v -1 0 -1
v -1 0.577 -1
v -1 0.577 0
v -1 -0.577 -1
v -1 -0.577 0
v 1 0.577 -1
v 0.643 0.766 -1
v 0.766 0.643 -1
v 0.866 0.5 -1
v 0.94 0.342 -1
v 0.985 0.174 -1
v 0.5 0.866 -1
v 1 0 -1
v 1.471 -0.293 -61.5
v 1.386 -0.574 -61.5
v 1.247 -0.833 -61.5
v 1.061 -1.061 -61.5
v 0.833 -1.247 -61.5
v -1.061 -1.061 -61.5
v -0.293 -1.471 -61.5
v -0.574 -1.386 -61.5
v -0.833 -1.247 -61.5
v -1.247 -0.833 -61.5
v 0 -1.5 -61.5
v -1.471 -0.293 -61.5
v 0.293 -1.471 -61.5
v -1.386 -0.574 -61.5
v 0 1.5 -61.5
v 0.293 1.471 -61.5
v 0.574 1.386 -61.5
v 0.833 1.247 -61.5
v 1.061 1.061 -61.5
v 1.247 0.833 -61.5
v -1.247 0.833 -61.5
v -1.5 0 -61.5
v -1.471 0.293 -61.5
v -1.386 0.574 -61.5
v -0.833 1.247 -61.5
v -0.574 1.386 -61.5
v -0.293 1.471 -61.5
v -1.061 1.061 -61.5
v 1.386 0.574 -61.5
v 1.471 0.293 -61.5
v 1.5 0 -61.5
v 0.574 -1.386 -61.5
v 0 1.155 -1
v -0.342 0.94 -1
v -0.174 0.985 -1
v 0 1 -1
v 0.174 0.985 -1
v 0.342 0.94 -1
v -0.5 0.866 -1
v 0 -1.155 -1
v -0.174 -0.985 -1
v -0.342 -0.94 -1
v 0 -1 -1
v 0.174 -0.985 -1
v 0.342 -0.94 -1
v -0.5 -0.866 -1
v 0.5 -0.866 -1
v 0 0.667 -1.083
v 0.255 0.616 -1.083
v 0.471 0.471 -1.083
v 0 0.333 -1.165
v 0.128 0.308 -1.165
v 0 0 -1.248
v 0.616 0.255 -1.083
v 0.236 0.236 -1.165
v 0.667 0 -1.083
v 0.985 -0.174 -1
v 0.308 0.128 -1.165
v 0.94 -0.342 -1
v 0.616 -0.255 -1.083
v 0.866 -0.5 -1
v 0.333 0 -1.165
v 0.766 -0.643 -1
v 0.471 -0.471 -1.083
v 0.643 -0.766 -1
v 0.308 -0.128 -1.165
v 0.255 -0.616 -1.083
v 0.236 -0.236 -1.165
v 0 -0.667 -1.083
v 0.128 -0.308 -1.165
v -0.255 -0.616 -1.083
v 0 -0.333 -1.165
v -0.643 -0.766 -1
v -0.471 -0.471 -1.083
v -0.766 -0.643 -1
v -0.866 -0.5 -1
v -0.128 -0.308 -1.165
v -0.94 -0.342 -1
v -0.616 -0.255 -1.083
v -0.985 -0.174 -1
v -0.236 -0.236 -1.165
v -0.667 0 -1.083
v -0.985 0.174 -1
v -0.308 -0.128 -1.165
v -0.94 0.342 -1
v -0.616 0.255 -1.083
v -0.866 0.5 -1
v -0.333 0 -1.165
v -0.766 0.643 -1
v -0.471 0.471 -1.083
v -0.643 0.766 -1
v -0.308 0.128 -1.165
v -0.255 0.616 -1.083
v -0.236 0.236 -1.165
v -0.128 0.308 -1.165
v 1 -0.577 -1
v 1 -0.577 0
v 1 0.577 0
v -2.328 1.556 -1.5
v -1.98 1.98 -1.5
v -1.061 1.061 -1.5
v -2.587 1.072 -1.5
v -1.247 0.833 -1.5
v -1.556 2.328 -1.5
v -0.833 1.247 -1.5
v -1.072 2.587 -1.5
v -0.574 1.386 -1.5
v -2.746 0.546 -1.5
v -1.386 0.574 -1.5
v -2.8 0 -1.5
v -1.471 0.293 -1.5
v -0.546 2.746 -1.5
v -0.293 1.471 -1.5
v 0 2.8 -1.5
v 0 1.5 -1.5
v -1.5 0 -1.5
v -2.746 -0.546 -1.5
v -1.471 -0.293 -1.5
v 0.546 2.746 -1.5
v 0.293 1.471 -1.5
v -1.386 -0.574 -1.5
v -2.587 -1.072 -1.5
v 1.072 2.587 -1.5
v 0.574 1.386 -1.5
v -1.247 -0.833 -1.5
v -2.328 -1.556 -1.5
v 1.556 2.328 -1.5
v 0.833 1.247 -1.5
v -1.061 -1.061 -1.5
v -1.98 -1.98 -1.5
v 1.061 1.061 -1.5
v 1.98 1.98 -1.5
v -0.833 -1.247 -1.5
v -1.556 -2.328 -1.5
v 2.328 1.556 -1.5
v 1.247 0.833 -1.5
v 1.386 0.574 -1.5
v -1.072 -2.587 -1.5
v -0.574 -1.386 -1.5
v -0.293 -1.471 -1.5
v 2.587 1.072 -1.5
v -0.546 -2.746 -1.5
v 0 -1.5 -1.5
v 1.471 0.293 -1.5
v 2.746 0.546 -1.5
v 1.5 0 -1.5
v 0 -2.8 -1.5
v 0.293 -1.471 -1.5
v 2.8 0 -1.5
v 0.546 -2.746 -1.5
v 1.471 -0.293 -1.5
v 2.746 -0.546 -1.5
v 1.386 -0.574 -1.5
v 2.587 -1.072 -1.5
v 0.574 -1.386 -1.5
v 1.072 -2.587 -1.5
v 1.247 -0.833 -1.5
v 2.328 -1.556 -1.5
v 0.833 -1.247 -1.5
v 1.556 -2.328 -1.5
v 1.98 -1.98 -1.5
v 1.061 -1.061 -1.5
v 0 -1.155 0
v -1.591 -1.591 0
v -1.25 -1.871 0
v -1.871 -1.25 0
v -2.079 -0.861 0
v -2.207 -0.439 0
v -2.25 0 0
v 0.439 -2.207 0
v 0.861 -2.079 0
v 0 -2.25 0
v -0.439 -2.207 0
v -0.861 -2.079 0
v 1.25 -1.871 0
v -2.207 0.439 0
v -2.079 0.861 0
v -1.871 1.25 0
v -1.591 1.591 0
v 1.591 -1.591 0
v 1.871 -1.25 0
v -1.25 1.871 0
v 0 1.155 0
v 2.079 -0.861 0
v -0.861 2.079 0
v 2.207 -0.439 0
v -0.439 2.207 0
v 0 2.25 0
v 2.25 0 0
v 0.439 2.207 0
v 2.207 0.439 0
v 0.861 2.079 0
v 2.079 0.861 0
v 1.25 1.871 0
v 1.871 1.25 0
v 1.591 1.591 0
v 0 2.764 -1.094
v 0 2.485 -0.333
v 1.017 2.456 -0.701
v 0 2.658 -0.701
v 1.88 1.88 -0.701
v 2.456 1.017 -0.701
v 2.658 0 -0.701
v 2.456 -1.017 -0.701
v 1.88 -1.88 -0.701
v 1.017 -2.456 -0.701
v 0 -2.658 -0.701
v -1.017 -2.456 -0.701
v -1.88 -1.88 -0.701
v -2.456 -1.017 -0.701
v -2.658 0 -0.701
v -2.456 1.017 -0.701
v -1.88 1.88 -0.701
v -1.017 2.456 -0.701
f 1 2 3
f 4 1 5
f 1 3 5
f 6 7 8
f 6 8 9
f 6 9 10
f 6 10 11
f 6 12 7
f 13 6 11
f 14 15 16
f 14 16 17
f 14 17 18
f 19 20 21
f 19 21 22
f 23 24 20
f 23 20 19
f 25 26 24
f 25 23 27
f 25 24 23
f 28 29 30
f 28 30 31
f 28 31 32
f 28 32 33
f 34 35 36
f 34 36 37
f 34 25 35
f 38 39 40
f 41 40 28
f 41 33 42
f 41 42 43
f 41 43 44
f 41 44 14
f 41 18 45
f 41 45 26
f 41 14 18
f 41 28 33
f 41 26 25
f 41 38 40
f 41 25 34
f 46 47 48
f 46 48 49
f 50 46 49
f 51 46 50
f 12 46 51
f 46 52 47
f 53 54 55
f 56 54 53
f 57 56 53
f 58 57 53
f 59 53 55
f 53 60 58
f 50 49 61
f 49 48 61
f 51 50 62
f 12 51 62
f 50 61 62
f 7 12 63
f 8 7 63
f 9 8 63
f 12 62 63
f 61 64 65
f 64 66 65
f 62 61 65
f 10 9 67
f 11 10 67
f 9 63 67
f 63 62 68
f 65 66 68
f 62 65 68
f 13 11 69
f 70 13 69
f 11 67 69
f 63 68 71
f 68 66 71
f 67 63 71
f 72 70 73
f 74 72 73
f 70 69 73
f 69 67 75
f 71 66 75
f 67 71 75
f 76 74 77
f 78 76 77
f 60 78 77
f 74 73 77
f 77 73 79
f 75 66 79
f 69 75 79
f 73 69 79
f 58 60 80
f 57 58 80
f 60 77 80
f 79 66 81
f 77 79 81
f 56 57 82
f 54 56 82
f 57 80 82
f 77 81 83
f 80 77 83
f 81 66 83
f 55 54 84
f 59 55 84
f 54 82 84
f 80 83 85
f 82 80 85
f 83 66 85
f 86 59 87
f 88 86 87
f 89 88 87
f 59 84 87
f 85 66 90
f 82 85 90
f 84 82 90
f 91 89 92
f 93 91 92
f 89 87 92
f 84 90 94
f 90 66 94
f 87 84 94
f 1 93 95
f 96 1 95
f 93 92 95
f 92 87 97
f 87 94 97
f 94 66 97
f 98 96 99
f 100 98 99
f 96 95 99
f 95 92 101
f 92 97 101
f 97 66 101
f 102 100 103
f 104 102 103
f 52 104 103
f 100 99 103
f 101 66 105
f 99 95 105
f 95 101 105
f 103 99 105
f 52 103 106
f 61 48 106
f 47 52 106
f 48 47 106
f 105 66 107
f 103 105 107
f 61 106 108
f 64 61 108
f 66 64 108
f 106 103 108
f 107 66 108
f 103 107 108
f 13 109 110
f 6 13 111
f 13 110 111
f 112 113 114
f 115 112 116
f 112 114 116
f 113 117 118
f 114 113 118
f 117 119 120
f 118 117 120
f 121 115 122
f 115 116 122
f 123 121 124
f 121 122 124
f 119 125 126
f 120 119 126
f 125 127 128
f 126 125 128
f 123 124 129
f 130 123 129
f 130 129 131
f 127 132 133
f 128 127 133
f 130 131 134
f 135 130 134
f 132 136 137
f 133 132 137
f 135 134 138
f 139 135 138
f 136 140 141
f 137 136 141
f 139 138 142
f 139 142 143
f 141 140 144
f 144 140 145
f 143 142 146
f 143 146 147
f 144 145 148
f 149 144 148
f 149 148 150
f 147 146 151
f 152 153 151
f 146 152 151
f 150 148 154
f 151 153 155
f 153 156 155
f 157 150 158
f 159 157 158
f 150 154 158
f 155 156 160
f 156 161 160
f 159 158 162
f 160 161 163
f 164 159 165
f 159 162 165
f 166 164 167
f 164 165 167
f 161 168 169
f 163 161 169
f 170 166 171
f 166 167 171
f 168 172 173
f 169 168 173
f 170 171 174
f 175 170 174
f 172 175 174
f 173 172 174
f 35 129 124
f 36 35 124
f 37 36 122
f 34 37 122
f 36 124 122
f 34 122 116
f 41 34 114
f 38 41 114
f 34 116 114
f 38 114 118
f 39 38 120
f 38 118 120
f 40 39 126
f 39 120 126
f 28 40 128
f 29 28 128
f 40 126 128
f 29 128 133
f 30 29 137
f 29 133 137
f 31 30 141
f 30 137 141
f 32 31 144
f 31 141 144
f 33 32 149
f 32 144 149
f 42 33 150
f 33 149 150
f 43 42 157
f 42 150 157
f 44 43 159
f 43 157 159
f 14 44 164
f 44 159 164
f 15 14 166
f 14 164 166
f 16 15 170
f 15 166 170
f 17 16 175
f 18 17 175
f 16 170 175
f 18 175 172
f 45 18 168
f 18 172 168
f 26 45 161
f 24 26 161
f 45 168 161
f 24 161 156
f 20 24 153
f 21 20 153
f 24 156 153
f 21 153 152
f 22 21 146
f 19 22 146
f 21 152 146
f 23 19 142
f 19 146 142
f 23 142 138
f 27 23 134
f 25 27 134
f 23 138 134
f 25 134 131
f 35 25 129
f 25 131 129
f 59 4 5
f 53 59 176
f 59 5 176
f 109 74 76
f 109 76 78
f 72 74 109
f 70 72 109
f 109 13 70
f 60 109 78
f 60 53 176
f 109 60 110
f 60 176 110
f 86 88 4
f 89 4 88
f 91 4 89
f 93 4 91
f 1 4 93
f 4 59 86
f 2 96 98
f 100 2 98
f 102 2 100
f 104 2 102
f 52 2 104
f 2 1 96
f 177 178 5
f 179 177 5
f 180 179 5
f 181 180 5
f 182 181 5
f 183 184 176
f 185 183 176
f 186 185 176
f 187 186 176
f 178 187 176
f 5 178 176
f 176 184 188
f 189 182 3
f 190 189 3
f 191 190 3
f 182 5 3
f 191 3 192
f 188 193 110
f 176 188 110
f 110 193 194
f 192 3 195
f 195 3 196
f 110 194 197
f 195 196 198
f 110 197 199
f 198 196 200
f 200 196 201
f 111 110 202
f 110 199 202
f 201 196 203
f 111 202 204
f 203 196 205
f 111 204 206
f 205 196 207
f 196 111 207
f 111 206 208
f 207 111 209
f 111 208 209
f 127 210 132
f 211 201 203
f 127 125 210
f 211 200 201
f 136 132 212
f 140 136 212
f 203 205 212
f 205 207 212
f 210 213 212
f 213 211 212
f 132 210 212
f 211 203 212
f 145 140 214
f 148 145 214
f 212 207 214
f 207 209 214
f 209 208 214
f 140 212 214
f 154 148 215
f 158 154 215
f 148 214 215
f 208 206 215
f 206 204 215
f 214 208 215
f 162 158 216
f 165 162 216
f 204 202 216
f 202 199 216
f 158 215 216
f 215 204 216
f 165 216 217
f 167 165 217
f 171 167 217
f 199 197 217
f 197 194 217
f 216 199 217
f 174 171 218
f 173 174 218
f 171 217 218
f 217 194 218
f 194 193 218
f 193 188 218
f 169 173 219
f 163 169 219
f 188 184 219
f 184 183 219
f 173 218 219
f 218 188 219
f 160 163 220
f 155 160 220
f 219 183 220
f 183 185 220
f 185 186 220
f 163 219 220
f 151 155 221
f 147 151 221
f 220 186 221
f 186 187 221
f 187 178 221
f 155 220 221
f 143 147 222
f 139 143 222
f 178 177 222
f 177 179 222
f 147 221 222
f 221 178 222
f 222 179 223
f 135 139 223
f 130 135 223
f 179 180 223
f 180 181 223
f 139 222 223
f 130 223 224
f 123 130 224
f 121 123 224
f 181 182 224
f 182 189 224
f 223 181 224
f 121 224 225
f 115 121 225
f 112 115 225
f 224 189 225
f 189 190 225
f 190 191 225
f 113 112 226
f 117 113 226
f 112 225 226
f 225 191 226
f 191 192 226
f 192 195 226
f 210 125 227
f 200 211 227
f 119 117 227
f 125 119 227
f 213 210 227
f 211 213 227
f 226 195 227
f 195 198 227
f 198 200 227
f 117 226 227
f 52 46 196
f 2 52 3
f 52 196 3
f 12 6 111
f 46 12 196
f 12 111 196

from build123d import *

# Parameters (mm, degrees)
CUT_EXTRUDE_2_DEPTH = 1
SKETCH_3_R          = 1.5
EXTRUDE_1_DEPTH     = 60


with BuildPart() as part:
    # 草图1 → 旋转1 (revolve)
    with BuildSketch(Plane(origin=(0, 0, 0), x_dir=(0, 0, -1), z_dir=(1, 0, 0))):
        with BuildLine():
            Line((0, 2.250343623), (0, 1))
            Line((0, 1), (0, 0))
            Line((0, 0), (1, 0))
            Line((1, 0), (1, 1))
            Line((1, 1), (1.248177586, 0))
            Line((1.248177586, 0), (1.5, 0))
            Line((1.5, 0), (1.5, 1.5))
            Line((1.5, 1.5), (1.5, 2.8))
            ThreePointArc((1.5, 2.8), (0.701231865, 2.658258964), (0, 2.250343623))
        make_face()
    revolve(axis=Axis((0, 0, 0), (0, 0, -1)))

    # 草图2 → 切除-拉伸2 (cut)
    with BuildSketch(Plane.XY):
        Polygon((0, 1.154700538), (-1, 0.577350269), (-1, -0.577350269), (0, -1.154700538), (1, -0.577350269), (1, 0.577350269), align=None)
    extrude(amount=-CUT_EXTRUDE_2_DEPTH, mode=Mode.SUBTRACT)

    # 草图3 → 凸台-拉伸1 (add)
    with BuildSketch(Plane(origin=(0, 0, -1.5), x_dir=(-1, 0, 0), z_dir=(0, 0, -1))):
        Circle(SKETCH_3_R)
    extrude(amount=EXTRUDE_1_DEPTH)


solid = part.part
